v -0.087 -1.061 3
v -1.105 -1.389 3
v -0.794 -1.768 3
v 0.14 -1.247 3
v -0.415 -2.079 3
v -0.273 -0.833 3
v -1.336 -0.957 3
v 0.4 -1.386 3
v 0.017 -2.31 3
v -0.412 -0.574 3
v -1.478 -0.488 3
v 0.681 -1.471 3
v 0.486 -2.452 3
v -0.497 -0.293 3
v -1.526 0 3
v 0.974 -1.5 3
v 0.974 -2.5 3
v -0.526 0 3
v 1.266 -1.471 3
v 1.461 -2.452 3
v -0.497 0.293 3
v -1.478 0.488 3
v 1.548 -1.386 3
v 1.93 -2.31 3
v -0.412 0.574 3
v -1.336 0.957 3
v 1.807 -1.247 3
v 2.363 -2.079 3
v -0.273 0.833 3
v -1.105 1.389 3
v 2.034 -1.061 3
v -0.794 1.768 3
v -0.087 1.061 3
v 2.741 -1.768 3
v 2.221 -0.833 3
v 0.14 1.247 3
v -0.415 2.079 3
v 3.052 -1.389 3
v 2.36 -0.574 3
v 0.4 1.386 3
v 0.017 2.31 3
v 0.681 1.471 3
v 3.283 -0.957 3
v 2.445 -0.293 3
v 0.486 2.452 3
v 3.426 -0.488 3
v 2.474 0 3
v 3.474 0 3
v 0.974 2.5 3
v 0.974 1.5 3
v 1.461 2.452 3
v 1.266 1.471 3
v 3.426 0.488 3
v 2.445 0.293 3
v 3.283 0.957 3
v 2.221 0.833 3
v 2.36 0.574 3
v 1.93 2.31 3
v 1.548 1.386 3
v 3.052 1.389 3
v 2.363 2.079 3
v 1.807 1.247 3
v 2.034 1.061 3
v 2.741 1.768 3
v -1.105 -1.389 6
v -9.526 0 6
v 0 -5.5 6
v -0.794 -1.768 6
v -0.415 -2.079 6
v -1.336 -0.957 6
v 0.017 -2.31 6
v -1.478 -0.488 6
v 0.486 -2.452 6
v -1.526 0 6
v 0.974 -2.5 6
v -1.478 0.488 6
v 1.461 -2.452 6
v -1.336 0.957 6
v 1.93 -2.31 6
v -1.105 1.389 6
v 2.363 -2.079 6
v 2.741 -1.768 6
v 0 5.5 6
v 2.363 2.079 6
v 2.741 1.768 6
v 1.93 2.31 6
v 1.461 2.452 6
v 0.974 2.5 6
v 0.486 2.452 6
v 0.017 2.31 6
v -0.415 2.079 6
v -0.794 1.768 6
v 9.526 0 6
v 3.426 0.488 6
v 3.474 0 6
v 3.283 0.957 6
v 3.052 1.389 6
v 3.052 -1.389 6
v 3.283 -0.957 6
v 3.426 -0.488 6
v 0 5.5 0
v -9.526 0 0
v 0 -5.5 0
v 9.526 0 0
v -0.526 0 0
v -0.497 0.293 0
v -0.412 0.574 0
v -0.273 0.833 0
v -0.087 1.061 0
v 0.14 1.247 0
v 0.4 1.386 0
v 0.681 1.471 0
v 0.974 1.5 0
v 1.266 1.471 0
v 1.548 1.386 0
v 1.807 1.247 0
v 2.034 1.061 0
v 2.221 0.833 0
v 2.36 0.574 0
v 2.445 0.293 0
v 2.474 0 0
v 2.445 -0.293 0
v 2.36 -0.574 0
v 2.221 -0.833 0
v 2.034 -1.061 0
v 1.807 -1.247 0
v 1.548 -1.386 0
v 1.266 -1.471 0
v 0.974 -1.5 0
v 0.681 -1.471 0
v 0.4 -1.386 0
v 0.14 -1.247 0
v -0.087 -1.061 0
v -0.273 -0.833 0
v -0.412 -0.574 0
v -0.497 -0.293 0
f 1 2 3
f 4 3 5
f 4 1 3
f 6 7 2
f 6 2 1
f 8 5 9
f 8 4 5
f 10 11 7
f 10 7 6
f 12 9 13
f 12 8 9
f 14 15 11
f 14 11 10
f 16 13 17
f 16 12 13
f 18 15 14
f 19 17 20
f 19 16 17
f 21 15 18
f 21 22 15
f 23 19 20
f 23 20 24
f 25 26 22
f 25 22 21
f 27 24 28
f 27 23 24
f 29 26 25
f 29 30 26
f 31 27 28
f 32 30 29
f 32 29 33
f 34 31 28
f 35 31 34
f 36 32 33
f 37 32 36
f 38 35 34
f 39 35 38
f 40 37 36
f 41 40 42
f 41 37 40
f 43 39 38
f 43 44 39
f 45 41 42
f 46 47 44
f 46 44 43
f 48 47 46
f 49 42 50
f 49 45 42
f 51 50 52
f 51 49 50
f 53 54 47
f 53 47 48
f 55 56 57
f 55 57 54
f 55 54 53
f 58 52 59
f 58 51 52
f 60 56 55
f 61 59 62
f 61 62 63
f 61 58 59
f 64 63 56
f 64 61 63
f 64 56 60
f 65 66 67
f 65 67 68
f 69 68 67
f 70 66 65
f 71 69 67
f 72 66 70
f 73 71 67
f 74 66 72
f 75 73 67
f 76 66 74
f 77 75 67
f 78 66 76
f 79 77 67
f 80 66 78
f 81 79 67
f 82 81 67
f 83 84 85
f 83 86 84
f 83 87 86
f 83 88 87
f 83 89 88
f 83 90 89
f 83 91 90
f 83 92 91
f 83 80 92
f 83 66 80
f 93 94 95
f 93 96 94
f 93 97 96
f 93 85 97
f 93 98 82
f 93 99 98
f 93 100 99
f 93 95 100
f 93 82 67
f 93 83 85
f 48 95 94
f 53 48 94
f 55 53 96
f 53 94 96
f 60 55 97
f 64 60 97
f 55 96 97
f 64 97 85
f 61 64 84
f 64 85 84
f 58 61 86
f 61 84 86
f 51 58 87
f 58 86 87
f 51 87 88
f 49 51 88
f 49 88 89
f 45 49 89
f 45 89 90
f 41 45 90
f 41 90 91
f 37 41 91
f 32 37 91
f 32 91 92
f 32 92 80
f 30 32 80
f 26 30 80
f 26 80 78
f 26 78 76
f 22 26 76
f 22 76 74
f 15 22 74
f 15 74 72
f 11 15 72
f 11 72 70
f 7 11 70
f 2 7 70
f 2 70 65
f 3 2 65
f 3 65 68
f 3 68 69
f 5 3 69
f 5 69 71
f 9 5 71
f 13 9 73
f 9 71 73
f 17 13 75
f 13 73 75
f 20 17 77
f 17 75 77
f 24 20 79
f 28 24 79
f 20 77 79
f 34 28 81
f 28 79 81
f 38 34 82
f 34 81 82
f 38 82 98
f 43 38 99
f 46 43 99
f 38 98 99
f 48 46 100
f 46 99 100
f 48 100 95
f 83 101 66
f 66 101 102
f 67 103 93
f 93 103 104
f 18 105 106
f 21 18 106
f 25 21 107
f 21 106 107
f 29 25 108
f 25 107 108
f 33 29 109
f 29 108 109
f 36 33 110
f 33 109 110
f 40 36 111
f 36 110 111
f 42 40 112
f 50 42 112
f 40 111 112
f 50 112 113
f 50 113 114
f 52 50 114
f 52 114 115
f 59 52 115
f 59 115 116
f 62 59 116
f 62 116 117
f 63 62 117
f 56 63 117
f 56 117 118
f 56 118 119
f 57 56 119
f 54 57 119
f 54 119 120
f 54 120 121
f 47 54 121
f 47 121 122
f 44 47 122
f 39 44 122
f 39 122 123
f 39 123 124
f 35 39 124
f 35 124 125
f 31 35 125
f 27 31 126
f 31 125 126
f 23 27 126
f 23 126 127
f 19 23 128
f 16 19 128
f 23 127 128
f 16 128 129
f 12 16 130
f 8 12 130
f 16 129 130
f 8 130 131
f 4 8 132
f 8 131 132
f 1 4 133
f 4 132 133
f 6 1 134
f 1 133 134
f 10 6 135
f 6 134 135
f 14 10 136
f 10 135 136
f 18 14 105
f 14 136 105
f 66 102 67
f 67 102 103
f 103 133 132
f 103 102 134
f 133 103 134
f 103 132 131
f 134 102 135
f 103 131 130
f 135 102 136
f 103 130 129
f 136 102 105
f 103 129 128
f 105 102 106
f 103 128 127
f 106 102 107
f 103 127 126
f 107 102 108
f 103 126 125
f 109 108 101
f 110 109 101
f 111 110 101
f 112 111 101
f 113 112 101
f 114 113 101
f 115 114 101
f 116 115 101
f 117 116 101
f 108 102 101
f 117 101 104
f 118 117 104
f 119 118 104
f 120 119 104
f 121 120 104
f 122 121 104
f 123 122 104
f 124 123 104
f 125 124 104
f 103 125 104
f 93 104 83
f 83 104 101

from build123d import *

# Parameters (mm, degrees)
EXTRUDE_1_DEPTH           = 6
HOLE_WIZARD_1_D           = 3
HOLE_WIZARD_1_DEPTH       = 6
HOLE_WIZARD_1_CBORE_D     = 5
HOLE_WIZARD_1_CBORE_DEPTH = 3


with BuildPart() as part:
    # 草图1 → 凸台-拉伸1 (new body)
    with BuildSketch(Plane.XY):
        Polygon((0, 5.5), (-9.526279442, 0), (0, -5.5), (9.526279442, 0), align=None)
    extrude(amount=EXTRUDE_1_DEPTH)

    # 孔1
    with Locations(Plane(origin=(0.973720558, 0, 6), x_dir=(1, 0, 0), z_dir=(0, 0, 1))):
        with Locations((0, 0)):
            CounterBoreHole(HOLE_WIZARD_1_D / 2, HOLE_WIZARD_1_CBORE_D / 2, HOLE_WIZARD_1_CBORE_DEPTH, depth=HOLE_WIZARD_1_DEPTH)


solid = part.part
